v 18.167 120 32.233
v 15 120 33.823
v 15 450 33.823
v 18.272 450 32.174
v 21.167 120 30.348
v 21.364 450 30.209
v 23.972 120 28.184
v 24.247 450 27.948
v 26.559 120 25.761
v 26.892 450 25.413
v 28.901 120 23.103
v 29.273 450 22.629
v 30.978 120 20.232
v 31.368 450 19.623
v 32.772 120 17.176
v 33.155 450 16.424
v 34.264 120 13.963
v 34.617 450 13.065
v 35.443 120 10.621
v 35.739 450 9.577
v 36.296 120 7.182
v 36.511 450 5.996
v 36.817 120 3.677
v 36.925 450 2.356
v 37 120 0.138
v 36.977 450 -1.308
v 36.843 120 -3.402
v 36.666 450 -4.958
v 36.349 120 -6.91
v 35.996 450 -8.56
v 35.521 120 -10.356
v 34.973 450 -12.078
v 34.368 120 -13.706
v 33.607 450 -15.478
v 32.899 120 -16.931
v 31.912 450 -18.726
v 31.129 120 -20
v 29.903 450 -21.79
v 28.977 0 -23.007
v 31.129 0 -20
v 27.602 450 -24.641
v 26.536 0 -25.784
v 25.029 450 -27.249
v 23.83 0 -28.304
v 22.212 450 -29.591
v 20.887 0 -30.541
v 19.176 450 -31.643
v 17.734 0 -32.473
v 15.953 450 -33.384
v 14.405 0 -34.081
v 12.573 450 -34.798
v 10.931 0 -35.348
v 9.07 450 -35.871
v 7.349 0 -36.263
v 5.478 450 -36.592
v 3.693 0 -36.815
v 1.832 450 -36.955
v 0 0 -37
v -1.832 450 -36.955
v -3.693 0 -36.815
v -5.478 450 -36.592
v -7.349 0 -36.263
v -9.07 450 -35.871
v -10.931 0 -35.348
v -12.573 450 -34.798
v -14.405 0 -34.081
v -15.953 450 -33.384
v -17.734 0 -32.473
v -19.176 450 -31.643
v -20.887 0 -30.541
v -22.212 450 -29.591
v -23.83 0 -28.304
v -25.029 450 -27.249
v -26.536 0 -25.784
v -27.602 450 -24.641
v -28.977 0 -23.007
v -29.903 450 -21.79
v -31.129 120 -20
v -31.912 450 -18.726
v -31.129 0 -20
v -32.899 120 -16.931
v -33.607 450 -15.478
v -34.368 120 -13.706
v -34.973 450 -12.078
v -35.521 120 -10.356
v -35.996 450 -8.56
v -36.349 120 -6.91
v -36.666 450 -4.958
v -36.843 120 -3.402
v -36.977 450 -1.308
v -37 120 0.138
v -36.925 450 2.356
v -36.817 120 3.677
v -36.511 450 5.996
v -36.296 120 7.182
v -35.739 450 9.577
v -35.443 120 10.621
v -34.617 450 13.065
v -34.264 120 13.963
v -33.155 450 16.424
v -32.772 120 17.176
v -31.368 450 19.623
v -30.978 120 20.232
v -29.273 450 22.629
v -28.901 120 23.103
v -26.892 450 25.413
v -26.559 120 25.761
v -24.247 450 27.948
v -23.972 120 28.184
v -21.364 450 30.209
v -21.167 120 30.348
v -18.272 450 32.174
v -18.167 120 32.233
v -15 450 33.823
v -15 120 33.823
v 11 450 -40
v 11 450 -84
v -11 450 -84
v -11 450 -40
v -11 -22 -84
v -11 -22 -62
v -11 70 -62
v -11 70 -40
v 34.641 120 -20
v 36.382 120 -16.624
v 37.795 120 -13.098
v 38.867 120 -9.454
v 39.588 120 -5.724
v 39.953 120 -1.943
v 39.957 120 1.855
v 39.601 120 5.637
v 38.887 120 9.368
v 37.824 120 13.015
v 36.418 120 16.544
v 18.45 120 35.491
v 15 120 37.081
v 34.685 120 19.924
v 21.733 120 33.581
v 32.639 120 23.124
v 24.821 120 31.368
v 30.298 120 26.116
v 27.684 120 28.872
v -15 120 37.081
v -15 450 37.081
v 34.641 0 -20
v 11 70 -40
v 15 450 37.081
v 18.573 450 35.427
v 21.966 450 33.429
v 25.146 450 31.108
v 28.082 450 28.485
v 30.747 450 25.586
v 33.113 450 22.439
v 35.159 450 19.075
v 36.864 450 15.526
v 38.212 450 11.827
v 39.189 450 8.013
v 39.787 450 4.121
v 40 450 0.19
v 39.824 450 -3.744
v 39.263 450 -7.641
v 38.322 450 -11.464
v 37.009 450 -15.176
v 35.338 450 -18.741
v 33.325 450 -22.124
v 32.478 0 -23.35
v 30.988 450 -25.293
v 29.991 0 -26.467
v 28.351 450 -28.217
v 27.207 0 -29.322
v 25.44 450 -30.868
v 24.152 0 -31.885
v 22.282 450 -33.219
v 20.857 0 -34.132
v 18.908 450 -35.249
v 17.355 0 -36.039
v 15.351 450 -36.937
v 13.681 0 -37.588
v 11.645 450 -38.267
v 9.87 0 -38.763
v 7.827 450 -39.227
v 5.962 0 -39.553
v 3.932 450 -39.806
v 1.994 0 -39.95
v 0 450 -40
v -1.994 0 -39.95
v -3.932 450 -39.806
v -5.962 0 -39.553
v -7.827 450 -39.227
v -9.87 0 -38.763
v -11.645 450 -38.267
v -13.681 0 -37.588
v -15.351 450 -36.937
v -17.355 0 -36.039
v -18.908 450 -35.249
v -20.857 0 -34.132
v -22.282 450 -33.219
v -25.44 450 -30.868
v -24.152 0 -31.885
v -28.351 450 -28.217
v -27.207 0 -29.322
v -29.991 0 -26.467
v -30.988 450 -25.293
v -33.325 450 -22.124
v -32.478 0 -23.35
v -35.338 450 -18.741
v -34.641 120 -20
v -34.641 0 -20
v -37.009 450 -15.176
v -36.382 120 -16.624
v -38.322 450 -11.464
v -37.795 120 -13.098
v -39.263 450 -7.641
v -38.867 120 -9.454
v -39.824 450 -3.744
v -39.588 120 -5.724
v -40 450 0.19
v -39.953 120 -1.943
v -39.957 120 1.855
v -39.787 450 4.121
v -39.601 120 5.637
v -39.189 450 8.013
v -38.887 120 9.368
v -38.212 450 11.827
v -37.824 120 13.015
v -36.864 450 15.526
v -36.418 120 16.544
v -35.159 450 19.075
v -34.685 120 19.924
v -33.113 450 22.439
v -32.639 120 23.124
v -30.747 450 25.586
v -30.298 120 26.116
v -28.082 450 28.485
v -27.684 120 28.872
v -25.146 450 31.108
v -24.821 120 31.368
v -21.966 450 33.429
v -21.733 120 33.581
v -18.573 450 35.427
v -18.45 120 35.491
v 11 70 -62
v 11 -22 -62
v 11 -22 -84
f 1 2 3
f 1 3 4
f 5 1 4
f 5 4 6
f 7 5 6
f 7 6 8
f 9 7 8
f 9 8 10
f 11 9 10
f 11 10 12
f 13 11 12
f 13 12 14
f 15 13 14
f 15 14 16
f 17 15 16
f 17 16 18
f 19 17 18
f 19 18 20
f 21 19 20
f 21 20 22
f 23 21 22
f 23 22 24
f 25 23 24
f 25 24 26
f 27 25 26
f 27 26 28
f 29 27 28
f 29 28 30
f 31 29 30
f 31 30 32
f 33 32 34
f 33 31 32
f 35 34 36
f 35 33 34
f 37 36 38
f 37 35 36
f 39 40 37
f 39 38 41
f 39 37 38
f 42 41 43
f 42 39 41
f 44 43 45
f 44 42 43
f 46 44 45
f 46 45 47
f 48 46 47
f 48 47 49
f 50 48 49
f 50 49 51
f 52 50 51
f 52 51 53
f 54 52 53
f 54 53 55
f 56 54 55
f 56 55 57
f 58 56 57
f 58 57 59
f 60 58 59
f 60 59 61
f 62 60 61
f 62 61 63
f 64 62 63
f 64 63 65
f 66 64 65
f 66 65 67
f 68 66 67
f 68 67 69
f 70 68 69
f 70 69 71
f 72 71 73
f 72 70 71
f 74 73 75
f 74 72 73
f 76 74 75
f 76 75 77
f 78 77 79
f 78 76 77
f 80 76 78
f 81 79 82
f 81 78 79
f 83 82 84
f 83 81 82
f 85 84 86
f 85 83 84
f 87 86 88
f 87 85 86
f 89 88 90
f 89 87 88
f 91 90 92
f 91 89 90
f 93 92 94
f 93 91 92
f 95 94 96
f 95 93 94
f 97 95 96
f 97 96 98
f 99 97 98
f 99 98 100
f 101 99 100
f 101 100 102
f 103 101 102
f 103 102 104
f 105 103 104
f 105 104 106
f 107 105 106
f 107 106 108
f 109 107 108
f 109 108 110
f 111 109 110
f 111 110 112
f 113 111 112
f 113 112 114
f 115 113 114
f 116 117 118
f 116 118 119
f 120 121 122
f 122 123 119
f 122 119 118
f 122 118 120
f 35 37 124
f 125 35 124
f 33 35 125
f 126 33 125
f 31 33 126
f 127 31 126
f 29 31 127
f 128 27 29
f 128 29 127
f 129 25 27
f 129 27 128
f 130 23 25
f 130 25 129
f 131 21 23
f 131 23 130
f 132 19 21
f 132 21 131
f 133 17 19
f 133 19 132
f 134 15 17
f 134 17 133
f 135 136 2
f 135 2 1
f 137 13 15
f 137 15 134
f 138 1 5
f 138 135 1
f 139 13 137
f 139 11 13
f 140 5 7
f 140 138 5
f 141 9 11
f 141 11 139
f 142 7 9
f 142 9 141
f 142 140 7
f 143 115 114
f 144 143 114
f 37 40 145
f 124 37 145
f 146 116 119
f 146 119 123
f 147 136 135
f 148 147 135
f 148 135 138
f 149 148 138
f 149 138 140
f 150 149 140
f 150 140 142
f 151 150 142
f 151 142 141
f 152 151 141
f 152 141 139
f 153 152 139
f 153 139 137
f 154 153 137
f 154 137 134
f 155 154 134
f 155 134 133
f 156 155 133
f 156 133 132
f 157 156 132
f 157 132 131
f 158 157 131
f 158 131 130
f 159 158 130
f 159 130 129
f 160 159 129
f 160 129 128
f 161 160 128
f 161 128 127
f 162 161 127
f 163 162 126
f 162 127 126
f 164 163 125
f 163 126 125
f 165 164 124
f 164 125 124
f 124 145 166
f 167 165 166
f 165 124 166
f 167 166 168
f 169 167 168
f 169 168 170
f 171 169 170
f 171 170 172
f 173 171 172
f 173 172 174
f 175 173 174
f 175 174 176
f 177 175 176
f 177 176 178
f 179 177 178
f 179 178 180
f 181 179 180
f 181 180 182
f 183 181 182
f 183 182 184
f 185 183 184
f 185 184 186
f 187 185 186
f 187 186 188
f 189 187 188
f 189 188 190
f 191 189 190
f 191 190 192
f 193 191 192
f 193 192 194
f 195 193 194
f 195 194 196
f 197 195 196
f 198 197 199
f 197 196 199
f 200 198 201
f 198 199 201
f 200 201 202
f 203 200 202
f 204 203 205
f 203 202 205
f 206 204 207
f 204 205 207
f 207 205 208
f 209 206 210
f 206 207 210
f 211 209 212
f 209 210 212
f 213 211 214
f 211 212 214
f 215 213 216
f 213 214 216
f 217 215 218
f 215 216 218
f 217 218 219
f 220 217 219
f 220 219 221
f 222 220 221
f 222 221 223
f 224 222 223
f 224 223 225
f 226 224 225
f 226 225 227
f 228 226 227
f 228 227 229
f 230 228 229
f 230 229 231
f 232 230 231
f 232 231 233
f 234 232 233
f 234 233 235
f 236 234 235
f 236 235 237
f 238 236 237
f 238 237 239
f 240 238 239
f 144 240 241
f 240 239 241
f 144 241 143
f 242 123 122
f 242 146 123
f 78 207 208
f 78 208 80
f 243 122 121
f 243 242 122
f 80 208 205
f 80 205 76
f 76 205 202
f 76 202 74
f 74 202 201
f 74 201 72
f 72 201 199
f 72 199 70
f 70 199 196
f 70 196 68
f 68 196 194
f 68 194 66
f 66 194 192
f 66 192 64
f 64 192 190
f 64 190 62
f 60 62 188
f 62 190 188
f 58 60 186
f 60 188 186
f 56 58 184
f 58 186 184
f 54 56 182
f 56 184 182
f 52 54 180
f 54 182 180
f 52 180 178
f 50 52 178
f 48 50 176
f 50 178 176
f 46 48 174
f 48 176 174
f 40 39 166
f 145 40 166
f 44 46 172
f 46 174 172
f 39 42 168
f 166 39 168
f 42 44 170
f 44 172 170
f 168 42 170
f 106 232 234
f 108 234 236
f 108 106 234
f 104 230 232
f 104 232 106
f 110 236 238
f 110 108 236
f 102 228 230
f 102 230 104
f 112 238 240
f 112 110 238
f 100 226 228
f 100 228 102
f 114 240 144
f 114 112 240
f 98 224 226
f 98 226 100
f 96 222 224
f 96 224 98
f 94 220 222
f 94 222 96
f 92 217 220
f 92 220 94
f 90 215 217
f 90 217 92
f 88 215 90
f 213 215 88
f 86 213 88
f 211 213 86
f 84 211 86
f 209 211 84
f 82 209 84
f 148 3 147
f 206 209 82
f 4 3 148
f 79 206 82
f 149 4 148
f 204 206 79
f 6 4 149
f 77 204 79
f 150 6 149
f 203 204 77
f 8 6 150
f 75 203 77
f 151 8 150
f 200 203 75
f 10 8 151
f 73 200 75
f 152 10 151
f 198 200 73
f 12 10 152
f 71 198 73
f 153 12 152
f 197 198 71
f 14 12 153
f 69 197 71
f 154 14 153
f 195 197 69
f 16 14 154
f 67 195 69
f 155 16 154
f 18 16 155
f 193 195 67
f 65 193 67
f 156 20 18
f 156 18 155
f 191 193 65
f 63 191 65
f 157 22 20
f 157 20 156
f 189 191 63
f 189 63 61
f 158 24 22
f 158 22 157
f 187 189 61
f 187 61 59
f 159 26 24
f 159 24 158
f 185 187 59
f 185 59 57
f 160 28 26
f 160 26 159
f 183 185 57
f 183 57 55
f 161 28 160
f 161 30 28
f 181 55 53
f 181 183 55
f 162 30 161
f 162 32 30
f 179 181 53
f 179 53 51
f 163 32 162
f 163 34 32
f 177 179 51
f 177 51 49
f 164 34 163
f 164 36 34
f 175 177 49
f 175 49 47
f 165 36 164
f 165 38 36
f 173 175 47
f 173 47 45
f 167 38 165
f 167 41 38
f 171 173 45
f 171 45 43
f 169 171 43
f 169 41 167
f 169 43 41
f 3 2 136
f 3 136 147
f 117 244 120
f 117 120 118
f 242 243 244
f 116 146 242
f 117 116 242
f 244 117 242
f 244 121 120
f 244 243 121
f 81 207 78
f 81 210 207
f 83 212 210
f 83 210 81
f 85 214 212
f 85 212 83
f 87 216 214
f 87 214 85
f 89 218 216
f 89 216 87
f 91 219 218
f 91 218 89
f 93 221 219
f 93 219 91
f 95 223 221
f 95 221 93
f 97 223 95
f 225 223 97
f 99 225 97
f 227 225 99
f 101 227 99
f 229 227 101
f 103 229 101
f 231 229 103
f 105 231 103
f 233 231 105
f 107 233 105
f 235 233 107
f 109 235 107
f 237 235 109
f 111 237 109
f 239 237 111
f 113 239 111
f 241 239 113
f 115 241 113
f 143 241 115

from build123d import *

# Parameters (mm, degrees)
ESQUISSE1_R                  = 40
ESQUISSE1_R_2                = 37
BOSS_EXTRU_1_DEPTH           = 450
ESQUISSE2_W                  = 80
ESQUISSE2_H                  = 120
ENL_V_MAT_EXTRU_1_DEPTH      = 41
ENL_V_MAT_EXTRU_1_DEPTH_BACK = 20
BOSS_EXTRU_2_DEPTH           = 11
ESQUISSE4_W                  = 30
ESQUISSE4_H                  = 450
ENL_V_MAT_EXTRU_2_DEPTH      = 41


with BuildPart() as part:
    # Esquisse1 → Boss.-Extru.1 (new body)
    with BuildSketch(Plane(origin=(0, 0, 0), x_dir=(1, 0, 0), z_dir=(0, 1, 0))):
        Circle(ESQUISSE1_R)
        Circle(ESQUISSE1_R_2, mode=Mode.SUBTRACT)
    extrude(amount=BOSS_EXTRU_1_DEPTH)

    # Esquisse2 → Enlèv. mat.-Extru.1 (cut, two sides)
    with BuildSketch(Plane.XY) as enl_v_mat_extru_1_sk:
        with Locations((0, 60)):
            Rectangle(ESQUISSE2_W, ESQUISSE2_H)
    extrude(amount=ENL_V_MAT_EXTRU_1_DEPTH, mode=Mode.SUBTRACT)
    extrude(enl_v_mat_extru_1_sk.sketch, amount=-ENL_V_MAT_EXTRU_1_DEPTH_BACK, mode=Mode.SUBTRACT)

    # Esquisse4 → Enlèv. mat.-Extru.2 (cut, through all)
    with BuildSketch(Plane.XY):
        with Locations((0, 225)):
            Rectangle(ESQUISSE4_W, ESQUISSE4_H)
    extrude(amount=ENL_V_MAT_EXTRU_2_DEPTH, mode=Mode.SUBTRACT)


with BuildPart() as body_2:
    # Esquisse3 → Boss.-Extru.2 (new body, symmetric)
    with BuildSketch(Plane(origin=(0, 0, 0), x_dir=(0, 0, -1), z_dir=(1, 0, 0))):
        Polygon((62, -22), (84, -22), (84, 450), (40, 450), (40, 70), (62, 70), align=None)
    extrude(amount=BOSS_EXTRU_2_DEPTH, both=True)


solid = Compound([part.part, body_2.part])
